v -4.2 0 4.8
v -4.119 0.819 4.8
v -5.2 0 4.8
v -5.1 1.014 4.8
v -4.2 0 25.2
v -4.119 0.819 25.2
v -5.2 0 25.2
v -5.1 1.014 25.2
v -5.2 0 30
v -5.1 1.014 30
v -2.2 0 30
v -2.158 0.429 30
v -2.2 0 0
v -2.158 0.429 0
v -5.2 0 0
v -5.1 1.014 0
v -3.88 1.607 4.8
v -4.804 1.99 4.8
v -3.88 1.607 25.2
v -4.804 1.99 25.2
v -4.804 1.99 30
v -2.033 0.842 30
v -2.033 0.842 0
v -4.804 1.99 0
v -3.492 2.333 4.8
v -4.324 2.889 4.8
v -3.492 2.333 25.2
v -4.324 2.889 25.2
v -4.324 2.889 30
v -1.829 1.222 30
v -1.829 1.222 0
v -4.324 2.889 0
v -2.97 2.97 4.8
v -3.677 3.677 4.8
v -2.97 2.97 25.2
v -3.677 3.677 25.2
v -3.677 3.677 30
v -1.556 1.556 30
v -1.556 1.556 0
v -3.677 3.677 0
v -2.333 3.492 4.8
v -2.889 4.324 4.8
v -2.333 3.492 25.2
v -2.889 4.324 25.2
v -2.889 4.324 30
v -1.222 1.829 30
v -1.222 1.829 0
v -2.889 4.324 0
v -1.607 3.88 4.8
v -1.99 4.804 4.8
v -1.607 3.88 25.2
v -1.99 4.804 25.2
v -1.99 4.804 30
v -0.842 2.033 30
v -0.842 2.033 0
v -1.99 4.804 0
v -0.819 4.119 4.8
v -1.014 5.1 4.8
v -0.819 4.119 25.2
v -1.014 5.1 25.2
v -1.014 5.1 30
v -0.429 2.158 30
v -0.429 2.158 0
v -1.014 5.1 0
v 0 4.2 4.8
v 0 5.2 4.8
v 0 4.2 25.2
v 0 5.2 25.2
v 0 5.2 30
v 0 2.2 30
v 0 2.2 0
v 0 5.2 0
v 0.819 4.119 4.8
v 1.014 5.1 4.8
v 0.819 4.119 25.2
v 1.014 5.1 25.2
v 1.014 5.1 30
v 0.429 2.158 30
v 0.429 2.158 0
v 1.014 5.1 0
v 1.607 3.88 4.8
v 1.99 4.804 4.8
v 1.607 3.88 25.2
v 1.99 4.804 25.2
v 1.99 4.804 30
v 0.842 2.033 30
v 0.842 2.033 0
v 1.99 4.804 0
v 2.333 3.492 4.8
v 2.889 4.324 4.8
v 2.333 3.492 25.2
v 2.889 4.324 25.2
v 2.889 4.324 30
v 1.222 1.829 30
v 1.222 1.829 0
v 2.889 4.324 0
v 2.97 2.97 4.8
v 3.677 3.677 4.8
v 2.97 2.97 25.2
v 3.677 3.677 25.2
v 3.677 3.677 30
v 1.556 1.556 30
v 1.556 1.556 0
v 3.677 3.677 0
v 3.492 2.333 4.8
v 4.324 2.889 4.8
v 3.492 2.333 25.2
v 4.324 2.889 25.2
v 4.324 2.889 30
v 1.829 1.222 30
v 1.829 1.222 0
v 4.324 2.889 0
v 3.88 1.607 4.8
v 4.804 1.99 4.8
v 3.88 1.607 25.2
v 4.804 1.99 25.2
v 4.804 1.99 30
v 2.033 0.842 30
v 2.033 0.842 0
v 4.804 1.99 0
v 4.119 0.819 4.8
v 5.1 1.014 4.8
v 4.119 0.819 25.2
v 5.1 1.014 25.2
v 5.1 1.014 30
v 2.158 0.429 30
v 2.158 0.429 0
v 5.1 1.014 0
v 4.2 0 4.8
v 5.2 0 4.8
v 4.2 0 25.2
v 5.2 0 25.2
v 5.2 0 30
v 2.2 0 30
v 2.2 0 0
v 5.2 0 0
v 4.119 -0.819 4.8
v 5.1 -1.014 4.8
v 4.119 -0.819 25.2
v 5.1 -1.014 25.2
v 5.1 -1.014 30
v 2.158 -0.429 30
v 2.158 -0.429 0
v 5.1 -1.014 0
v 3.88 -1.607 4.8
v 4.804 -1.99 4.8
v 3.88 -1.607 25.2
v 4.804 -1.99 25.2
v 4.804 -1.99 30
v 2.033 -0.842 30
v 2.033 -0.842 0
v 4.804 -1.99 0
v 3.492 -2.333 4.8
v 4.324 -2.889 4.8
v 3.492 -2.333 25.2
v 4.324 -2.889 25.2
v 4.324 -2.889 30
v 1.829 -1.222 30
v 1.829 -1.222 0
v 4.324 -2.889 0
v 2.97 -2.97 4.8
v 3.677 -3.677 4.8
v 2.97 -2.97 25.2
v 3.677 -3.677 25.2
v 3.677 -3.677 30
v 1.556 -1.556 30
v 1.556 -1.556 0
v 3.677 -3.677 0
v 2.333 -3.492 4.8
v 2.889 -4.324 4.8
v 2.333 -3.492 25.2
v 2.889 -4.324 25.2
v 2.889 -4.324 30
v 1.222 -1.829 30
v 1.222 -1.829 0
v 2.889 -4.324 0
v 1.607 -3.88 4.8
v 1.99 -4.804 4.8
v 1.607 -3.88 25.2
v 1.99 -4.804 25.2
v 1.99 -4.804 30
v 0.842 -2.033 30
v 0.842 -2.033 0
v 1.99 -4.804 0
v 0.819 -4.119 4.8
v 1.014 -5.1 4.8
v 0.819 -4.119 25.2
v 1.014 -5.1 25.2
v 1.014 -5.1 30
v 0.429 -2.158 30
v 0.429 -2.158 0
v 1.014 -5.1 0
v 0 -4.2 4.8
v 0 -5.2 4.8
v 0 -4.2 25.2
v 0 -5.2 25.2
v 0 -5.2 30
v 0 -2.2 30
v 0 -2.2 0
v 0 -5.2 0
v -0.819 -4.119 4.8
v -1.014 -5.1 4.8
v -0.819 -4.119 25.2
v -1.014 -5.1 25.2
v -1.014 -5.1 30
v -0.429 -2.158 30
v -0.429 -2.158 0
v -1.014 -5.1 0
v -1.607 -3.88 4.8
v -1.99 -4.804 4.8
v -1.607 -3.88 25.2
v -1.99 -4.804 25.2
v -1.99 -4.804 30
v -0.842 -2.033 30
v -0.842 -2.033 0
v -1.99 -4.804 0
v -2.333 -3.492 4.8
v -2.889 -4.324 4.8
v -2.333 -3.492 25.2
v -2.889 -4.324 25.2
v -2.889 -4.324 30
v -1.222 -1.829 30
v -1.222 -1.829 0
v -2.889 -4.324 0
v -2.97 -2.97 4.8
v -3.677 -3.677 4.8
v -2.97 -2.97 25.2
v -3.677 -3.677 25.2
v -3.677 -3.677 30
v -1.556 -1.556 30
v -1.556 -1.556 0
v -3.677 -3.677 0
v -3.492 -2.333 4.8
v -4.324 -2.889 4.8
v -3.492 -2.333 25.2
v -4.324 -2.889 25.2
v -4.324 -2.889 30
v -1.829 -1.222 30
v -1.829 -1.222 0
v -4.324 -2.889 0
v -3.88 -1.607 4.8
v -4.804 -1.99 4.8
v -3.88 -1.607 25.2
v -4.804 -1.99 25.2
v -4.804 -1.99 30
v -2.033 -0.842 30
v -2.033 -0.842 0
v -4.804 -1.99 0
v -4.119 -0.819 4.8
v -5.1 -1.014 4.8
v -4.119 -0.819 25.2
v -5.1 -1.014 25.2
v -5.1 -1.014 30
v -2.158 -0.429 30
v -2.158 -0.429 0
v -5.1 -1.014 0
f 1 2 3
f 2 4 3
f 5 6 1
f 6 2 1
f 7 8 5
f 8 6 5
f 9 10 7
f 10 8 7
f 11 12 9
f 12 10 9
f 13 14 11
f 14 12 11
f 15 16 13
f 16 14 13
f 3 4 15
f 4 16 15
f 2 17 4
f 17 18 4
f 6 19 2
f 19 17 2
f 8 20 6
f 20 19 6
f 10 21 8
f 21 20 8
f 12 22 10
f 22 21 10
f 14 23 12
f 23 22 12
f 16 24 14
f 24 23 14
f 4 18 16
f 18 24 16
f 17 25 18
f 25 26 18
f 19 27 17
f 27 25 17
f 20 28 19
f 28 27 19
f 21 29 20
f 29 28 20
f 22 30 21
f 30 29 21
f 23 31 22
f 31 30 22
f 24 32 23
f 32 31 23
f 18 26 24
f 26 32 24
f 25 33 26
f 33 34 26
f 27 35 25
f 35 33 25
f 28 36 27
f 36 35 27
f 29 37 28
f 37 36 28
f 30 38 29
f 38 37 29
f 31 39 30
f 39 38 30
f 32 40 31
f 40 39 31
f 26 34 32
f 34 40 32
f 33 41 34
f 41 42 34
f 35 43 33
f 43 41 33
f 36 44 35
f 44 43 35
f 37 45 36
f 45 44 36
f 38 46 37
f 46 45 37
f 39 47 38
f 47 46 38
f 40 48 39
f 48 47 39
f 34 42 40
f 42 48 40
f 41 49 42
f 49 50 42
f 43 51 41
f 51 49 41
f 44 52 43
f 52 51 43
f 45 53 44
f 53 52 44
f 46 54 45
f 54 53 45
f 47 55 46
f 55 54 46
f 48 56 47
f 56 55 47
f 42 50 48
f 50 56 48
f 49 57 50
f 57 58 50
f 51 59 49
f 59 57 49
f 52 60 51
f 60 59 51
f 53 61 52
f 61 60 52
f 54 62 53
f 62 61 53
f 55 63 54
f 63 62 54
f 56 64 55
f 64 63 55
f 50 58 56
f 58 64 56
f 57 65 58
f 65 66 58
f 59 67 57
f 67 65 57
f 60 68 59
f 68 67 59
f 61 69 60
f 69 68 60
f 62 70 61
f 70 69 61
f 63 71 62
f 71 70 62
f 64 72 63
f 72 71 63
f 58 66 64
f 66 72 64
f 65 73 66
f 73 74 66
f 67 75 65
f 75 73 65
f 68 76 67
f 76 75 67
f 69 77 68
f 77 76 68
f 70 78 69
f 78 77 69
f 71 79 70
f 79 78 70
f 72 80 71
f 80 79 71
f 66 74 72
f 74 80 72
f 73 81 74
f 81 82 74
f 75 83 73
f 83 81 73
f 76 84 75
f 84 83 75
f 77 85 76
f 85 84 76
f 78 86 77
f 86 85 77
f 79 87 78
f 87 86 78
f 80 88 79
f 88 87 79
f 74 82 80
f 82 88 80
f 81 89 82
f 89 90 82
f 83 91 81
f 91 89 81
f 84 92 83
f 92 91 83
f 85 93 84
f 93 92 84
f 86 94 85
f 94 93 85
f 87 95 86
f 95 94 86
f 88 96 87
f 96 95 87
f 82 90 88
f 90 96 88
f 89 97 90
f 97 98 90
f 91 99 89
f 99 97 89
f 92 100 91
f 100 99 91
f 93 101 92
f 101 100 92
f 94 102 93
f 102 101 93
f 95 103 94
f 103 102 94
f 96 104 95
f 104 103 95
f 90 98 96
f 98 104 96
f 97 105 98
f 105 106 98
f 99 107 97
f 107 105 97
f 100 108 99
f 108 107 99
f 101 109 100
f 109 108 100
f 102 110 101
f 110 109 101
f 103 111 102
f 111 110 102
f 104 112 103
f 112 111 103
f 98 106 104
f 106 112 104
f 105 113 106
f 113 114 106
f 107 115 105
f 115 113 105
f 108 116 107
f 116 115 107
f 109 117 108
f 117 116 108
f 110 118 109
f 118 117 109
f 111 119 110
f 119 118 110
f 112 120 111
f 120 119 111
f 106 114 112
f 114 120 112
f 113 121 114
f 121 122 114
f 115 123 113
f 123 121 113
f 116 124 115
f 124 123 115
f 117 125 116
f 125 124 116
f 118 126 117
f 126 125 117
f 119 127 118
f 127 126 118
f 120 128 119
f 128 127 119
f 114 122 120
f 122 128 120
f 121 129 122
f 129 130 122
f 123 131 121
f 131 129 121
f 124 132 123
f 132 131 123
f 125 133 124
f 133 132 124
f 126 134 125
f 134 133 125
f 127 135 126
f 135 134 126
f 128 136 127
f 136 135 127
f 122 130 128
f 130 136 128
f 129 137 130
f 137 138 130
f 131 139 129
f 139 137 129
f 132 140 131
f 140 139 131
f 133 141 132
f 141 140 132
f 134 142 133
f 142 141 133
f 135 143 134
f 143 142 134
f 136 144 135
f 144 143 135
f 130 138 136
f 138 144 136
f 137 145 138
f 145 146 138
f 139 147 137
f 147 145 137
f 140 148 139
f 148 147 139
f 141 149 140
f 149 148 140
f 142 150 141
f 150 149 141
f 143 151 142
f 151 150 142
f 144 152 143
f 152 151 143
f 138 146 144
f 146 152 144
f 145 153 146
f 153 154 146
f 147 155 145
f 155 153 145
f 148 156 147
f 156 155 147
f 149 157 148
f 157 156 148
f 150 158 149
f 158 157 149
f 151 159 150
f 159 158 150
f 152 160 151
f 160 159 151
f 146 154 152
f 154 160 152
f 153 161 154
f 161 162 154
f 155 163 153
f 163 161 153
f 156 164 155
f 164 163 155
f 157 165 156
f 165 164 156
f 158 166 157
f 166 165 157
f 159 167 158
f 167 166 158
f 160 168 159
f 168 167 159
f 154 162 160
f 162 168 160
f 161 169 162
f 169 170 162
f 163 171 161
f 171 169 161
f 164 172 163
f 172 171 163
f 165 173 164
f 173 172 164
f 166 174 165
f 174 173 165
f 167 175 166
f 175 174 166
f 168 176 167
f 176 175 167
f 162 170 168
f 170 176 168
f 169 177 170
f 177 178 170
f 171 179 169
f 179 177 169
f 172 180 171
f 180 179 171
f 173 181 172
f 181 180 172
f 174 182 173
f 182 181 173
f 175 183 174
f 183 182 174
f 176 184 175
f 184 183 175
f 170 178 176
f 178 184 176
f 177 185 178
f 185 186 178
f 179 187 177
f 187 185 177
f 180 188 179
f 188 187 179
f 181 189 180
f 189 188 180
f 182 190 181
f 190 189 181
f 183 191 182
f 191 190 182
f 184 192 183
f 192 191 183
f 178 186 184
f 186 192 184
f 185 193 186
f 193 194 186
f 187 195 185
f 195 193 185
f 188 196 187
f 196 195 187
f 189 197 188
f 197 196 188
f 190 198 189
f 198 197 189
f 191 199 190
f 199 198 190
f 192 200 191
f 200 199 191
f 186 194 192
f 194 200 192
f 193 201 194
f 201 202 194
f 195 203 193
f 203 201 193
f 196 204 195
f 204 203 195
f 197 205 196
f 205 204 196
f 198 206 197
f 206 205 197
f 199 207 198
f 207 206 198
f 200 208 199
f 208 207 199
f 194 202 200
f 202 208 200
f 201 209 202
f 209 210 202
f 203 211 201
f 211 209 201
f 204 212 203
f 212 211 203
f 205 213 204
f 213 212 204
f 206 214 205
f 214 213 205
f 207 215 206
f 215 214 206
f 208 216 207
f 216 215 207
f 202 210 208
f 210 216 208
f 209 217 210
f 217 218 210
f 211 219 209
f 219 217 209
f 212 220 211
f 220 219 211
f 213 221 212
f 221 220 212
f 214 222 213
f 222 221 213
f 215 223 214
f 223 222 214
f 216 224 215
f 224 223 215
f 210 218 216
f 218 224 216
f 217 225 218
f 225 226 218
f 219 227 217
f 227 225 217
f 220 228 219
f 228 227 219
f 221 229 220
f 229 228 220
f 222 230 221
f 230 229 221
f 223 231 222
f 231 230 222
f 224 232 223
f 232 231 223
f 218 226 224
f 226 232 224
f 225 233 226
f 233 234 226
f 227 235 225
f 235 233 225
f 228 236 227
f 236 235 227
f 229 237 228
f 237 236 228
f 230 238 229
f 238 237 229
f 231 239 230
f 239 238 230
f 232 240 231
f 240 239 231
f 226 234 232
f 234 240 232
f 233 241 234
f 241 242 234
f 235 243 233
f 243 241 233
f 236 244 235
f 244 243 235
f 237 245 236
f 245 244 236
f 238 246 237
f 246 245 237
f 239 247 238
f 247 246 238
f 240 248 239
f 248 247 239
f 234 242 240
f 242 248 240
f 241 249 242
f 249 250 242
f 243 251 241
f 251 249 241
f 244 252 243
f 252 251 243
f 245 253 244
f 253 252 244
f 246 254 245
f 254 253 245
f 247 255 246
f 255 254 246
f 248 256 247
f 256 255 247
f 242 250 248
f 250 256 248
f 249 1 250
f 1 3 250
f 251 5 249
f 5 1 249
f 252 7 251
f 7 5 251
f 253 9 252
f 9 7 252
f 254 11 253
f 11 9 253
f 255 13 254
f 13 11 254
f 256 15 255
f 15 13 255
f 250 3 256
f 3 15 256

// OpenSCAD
$fn = 32;

// ----------------------------------------------------------------------
// Profiled standoff: spool spacer, 30 mm long, bore 4.4 mm
// ----------------------------------------------------------------------

// --- parameters (mm) ---
revolve_angle = 360;      // full turn around the Z axis
profile_points = 8;       // points of the closed outline

profile = [[2.2, 0], [5.2, 0], [5.2, 4.8], [4.2, 4.8], [4.2, 25.2], [5.2, 25.2], [5.2, 30], [2.2, 30]];  // single closed polygon, 8 points, counter clockwise

// --- the one profile operation ---
rotate_extrude(angle = revolve_angle) polygon(points = profile);
